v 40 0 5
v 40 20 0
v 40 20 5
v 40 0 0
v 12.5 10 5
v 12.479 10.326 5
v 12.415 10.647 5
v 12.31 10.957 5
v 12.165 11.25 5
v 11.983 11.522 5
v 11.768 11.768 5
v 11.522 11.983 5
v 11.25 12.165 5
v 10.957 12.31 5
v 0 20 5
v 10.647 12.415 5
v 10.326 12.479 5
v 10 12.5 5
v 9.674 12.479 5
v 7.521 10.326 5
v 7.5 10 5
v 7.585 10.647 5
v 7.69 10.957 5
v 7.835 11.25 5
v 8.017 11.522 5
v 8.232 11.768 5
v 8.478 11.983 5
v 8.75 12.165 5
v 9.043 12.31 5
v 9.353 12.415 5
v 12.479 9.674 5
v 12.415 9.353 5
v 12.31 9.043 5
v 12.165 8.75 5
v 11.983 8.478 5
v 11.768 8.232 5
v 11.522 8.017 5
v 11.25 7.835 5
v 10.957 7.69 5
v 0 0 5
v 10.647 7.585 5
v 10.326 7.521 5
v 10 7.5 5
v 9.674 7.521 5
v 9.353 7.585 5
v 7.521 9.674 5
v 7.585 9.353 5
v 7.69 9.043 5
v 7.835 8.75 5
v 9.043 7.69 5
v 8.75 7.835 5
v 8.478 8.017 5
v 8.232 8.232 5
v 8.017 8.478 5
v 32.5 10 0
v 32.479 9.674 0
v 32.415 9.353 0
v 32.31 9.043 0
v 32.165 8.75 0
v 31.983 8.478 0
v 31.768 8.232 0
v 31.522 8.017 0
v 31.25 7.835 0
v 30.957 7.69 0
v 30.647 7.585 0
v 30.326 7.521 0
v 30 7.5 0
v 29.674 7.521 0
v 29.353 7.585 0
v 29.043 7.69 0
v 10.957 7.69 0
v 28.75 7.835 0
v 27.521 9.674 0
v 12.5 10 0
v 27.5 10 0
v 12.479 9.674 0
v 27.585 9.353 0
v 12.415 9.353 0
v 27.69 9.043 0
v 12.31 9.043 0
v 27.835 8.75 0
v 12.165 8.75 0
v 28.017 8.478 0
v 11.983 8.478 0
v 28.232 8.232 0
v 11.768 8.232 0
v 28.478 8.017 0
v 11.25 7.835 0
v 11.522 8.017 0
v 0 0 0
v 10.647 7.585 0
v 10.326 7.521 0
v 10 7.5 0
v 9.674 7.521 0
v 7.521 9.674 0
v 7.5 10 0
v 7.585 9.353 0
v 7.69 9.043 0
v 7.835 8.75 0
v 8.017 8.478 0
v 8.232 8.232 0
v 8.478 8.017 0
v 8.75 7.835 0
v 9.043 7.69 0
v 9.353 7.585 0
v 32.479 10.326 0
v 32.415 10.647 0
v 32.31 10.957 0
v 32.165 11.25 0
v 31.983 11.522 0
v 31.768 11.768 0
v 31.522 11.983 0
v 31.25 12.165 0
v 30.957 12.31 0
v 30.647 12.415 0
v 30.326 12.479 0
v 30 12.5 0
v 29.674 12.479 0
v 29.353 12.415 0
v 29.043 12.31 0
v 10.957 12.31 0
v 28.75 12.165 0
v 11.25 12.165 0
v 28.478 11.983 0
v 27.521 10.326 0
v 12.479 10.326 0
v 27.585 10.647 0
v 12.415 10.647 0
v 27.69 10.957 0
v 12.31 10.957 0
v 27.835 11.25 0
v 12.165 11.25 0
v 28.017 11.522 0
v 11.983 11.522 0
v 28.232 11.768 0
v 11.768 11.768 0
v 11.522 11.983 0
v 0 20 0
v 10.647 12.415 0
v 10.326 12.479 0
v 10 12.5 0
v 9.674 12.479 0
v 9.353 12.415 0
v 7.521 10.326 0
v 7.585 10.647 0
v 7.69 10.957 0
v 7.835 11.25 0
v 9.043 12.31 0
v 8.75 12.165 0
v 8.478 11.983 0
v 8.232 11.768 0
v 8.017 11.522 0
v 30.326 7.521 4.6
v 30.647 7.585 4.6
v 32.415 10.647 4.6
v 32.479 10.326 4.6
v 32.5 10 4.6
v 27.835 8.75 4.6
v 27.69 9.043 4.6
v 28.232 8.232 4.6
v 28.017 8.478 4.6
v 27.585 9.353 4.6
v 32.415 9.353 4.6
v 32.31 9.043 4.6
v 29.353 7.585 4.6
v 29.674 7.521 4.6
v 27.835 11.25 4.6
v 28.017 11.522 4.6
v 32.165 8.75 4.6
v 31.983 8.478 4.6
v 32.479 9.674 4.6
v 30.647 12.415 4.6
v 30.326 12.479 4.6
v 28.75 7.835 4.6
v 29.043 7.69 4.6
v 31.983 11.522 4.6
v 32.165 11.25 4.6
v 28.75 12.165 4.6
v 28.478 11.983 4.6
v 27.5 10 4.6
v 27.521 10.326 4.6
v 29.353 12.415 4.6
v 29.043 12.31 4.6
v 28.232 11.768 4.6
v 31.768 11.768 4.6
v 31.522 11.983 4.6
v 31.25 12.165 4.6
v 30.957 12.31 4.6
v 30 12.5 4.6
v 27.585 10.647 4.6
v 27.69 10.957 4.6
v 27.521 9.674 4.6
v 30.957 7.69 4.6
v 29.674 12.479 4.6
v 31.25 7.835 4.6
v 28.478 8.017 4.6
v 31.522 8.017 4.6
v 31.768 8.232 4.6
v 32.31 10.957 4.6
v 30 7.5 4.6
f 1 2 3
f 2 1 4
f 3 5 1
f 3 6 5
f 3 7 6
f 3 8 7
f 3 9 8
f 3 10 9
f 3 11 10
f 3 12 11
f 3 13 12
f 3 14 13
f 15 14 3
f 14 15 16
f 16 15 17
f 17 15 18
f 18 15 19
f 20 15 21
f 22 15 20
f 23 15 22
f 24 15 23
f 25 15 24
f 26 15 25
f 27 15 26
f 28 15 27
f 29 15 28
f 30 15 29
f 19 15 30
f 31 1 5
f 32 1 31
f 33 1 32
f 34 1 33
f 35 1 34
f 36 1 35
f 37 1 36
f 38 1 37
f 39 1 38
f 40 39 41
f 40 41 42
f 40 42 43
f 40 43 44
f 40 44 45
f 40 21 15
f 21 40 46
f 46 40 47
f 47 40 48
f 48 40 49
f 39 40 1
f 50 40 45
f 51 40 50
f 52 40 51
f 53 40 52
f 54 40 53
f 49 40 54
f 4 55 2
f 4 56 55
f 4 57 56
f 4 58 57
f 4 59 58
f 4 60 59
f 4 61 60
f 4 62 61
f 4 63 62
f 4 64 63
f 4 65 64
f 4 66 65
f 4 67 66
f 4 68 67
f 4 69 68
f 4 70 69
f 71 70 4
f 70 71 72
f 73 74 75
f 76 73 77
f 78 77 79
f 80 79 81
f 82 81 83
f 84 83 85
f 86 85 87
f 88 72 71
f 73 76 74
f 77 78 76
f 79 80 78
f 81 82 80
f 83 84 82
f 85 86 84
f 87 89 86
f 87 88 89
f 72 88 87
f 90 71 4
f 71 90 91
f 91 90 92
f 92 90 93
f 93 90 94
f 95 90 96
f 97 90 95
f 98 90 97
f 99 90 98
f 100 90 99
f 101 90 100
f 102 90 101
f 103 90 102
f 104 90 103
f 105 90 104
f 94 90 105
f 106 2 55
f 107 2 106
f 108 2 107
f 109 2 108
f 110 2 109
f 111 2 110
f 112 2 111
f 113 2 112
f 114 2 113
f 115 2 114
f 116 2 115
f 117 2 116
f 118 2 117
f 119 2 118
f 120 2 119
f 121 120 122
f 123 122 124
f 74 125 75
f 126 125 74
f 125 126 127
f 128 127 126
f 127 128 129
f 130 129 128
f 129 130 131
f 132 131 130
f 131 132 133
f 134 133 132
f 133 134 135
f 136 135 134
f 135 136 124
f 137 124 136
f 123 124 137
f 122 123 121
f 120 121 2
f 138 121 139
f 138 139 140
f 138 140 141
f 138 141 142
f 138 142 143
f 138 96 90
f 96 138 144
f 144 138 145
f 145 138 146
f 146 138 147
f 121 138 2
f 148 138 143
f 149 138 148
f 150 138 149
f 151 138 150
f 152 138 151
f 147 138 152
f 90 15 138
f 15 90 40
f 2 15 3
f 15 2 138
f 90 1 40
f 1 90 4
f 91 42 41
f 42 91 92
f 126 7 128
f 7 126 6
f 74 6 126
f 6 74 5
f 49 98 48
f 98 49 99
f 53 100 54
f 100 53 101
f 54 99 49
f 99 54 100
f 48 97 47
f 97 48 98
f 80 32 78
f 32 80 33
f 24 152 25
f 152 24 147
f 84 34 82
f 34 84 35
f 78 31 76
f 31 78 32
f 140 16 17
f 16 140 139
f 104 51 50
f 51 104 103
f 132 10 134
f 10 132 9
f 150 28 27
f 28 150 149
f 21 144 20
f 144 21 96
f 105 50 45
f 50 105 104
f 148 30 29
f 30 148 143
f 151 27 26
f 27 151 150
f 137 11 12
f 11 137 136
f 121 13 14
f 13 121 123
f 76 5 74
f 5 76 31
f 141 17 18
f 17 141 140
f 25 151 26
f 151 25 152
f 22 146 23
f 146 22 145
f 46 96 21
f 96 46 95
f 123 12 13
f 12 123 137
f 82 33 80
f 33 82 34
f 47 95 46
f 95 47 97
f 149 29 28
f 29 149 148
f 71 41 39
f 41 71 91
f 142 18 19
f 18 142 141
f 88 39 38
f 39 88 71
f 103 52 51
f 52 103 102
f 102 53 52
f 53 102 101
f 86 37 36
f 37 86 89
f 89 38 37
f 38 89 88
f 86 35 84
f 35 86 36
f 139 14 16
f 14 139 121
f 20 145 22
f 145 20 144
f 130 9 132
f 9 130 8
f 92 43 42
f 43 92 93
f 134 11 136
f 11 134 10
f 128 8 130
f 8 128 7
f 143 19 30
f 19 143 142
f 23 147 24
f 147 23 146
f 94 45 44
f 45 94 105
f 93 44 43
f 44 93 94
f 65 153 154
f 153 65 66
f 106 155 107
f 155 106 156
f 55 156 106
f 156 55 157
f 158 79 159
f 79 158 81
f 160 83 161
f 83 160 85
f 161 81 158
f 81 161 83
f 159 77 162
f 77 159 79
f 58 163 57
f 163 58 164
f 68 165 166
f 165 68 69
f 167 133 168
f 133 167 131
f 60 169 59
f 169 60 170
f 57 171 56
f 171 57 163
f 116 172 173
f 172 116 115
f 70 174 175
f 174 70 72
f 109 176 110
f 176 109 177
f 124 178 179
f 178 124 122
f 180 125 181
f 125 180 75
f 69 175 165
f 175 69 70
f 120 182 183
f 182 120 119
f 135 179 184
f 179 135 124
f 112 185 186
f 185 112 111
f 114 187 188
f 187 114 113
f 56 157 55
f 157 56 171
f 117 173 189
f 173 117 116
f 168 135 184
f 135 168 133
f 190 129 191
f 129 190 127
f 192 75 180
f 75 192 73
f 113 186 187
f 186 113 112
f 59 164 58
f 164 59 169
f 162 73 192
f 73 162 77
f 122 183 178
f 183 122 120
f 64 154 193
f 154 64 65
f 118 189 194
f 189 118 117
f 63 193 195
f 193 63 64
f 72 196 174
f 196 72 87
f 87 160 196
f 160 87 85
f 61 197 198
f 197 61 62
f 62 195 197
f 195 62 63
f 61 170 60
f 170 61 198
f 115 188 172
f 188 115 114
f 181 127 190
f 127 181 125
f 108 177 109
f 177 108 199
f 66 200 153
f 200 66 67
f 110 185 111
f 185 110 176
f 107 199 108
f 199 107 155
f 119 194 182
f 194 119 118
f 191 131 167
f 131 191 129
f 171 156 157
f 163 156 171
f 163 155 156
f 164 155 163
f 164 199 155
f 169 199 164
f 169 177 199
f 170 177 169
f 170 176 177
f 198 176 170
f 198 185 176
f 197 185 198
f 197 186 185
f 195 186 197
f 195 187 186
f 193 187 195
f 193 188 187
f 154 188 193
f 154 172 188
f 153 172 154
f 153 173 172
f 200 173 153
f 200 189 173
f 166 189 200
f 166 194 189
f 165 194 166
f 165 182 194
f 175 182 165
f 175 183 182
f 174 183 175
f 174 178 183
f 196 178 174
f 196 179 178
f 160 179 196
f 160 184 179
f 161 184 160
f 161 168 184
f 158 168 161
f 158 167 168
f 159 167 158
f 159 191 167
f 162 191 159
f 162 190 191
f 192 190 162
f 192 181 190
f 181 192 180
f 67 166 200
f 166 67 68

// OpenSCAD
// EXPECTED_THROUGH_HOLES: 2
// B class (16/95 incidents): a bore that looks right from above but is sealed
// by a 0.4 mm skin. Bbox, connectivity and printability all pass.
$fn = 48;
difference() {
    cube([40, 20, 5]);
    translate([10, 10, -1]) cylinder(d = 5, h = 7);
    translate([30, 10, -1]) cylinder(d = 5, h = 5.6);   // stops 0.4 below the top
}
